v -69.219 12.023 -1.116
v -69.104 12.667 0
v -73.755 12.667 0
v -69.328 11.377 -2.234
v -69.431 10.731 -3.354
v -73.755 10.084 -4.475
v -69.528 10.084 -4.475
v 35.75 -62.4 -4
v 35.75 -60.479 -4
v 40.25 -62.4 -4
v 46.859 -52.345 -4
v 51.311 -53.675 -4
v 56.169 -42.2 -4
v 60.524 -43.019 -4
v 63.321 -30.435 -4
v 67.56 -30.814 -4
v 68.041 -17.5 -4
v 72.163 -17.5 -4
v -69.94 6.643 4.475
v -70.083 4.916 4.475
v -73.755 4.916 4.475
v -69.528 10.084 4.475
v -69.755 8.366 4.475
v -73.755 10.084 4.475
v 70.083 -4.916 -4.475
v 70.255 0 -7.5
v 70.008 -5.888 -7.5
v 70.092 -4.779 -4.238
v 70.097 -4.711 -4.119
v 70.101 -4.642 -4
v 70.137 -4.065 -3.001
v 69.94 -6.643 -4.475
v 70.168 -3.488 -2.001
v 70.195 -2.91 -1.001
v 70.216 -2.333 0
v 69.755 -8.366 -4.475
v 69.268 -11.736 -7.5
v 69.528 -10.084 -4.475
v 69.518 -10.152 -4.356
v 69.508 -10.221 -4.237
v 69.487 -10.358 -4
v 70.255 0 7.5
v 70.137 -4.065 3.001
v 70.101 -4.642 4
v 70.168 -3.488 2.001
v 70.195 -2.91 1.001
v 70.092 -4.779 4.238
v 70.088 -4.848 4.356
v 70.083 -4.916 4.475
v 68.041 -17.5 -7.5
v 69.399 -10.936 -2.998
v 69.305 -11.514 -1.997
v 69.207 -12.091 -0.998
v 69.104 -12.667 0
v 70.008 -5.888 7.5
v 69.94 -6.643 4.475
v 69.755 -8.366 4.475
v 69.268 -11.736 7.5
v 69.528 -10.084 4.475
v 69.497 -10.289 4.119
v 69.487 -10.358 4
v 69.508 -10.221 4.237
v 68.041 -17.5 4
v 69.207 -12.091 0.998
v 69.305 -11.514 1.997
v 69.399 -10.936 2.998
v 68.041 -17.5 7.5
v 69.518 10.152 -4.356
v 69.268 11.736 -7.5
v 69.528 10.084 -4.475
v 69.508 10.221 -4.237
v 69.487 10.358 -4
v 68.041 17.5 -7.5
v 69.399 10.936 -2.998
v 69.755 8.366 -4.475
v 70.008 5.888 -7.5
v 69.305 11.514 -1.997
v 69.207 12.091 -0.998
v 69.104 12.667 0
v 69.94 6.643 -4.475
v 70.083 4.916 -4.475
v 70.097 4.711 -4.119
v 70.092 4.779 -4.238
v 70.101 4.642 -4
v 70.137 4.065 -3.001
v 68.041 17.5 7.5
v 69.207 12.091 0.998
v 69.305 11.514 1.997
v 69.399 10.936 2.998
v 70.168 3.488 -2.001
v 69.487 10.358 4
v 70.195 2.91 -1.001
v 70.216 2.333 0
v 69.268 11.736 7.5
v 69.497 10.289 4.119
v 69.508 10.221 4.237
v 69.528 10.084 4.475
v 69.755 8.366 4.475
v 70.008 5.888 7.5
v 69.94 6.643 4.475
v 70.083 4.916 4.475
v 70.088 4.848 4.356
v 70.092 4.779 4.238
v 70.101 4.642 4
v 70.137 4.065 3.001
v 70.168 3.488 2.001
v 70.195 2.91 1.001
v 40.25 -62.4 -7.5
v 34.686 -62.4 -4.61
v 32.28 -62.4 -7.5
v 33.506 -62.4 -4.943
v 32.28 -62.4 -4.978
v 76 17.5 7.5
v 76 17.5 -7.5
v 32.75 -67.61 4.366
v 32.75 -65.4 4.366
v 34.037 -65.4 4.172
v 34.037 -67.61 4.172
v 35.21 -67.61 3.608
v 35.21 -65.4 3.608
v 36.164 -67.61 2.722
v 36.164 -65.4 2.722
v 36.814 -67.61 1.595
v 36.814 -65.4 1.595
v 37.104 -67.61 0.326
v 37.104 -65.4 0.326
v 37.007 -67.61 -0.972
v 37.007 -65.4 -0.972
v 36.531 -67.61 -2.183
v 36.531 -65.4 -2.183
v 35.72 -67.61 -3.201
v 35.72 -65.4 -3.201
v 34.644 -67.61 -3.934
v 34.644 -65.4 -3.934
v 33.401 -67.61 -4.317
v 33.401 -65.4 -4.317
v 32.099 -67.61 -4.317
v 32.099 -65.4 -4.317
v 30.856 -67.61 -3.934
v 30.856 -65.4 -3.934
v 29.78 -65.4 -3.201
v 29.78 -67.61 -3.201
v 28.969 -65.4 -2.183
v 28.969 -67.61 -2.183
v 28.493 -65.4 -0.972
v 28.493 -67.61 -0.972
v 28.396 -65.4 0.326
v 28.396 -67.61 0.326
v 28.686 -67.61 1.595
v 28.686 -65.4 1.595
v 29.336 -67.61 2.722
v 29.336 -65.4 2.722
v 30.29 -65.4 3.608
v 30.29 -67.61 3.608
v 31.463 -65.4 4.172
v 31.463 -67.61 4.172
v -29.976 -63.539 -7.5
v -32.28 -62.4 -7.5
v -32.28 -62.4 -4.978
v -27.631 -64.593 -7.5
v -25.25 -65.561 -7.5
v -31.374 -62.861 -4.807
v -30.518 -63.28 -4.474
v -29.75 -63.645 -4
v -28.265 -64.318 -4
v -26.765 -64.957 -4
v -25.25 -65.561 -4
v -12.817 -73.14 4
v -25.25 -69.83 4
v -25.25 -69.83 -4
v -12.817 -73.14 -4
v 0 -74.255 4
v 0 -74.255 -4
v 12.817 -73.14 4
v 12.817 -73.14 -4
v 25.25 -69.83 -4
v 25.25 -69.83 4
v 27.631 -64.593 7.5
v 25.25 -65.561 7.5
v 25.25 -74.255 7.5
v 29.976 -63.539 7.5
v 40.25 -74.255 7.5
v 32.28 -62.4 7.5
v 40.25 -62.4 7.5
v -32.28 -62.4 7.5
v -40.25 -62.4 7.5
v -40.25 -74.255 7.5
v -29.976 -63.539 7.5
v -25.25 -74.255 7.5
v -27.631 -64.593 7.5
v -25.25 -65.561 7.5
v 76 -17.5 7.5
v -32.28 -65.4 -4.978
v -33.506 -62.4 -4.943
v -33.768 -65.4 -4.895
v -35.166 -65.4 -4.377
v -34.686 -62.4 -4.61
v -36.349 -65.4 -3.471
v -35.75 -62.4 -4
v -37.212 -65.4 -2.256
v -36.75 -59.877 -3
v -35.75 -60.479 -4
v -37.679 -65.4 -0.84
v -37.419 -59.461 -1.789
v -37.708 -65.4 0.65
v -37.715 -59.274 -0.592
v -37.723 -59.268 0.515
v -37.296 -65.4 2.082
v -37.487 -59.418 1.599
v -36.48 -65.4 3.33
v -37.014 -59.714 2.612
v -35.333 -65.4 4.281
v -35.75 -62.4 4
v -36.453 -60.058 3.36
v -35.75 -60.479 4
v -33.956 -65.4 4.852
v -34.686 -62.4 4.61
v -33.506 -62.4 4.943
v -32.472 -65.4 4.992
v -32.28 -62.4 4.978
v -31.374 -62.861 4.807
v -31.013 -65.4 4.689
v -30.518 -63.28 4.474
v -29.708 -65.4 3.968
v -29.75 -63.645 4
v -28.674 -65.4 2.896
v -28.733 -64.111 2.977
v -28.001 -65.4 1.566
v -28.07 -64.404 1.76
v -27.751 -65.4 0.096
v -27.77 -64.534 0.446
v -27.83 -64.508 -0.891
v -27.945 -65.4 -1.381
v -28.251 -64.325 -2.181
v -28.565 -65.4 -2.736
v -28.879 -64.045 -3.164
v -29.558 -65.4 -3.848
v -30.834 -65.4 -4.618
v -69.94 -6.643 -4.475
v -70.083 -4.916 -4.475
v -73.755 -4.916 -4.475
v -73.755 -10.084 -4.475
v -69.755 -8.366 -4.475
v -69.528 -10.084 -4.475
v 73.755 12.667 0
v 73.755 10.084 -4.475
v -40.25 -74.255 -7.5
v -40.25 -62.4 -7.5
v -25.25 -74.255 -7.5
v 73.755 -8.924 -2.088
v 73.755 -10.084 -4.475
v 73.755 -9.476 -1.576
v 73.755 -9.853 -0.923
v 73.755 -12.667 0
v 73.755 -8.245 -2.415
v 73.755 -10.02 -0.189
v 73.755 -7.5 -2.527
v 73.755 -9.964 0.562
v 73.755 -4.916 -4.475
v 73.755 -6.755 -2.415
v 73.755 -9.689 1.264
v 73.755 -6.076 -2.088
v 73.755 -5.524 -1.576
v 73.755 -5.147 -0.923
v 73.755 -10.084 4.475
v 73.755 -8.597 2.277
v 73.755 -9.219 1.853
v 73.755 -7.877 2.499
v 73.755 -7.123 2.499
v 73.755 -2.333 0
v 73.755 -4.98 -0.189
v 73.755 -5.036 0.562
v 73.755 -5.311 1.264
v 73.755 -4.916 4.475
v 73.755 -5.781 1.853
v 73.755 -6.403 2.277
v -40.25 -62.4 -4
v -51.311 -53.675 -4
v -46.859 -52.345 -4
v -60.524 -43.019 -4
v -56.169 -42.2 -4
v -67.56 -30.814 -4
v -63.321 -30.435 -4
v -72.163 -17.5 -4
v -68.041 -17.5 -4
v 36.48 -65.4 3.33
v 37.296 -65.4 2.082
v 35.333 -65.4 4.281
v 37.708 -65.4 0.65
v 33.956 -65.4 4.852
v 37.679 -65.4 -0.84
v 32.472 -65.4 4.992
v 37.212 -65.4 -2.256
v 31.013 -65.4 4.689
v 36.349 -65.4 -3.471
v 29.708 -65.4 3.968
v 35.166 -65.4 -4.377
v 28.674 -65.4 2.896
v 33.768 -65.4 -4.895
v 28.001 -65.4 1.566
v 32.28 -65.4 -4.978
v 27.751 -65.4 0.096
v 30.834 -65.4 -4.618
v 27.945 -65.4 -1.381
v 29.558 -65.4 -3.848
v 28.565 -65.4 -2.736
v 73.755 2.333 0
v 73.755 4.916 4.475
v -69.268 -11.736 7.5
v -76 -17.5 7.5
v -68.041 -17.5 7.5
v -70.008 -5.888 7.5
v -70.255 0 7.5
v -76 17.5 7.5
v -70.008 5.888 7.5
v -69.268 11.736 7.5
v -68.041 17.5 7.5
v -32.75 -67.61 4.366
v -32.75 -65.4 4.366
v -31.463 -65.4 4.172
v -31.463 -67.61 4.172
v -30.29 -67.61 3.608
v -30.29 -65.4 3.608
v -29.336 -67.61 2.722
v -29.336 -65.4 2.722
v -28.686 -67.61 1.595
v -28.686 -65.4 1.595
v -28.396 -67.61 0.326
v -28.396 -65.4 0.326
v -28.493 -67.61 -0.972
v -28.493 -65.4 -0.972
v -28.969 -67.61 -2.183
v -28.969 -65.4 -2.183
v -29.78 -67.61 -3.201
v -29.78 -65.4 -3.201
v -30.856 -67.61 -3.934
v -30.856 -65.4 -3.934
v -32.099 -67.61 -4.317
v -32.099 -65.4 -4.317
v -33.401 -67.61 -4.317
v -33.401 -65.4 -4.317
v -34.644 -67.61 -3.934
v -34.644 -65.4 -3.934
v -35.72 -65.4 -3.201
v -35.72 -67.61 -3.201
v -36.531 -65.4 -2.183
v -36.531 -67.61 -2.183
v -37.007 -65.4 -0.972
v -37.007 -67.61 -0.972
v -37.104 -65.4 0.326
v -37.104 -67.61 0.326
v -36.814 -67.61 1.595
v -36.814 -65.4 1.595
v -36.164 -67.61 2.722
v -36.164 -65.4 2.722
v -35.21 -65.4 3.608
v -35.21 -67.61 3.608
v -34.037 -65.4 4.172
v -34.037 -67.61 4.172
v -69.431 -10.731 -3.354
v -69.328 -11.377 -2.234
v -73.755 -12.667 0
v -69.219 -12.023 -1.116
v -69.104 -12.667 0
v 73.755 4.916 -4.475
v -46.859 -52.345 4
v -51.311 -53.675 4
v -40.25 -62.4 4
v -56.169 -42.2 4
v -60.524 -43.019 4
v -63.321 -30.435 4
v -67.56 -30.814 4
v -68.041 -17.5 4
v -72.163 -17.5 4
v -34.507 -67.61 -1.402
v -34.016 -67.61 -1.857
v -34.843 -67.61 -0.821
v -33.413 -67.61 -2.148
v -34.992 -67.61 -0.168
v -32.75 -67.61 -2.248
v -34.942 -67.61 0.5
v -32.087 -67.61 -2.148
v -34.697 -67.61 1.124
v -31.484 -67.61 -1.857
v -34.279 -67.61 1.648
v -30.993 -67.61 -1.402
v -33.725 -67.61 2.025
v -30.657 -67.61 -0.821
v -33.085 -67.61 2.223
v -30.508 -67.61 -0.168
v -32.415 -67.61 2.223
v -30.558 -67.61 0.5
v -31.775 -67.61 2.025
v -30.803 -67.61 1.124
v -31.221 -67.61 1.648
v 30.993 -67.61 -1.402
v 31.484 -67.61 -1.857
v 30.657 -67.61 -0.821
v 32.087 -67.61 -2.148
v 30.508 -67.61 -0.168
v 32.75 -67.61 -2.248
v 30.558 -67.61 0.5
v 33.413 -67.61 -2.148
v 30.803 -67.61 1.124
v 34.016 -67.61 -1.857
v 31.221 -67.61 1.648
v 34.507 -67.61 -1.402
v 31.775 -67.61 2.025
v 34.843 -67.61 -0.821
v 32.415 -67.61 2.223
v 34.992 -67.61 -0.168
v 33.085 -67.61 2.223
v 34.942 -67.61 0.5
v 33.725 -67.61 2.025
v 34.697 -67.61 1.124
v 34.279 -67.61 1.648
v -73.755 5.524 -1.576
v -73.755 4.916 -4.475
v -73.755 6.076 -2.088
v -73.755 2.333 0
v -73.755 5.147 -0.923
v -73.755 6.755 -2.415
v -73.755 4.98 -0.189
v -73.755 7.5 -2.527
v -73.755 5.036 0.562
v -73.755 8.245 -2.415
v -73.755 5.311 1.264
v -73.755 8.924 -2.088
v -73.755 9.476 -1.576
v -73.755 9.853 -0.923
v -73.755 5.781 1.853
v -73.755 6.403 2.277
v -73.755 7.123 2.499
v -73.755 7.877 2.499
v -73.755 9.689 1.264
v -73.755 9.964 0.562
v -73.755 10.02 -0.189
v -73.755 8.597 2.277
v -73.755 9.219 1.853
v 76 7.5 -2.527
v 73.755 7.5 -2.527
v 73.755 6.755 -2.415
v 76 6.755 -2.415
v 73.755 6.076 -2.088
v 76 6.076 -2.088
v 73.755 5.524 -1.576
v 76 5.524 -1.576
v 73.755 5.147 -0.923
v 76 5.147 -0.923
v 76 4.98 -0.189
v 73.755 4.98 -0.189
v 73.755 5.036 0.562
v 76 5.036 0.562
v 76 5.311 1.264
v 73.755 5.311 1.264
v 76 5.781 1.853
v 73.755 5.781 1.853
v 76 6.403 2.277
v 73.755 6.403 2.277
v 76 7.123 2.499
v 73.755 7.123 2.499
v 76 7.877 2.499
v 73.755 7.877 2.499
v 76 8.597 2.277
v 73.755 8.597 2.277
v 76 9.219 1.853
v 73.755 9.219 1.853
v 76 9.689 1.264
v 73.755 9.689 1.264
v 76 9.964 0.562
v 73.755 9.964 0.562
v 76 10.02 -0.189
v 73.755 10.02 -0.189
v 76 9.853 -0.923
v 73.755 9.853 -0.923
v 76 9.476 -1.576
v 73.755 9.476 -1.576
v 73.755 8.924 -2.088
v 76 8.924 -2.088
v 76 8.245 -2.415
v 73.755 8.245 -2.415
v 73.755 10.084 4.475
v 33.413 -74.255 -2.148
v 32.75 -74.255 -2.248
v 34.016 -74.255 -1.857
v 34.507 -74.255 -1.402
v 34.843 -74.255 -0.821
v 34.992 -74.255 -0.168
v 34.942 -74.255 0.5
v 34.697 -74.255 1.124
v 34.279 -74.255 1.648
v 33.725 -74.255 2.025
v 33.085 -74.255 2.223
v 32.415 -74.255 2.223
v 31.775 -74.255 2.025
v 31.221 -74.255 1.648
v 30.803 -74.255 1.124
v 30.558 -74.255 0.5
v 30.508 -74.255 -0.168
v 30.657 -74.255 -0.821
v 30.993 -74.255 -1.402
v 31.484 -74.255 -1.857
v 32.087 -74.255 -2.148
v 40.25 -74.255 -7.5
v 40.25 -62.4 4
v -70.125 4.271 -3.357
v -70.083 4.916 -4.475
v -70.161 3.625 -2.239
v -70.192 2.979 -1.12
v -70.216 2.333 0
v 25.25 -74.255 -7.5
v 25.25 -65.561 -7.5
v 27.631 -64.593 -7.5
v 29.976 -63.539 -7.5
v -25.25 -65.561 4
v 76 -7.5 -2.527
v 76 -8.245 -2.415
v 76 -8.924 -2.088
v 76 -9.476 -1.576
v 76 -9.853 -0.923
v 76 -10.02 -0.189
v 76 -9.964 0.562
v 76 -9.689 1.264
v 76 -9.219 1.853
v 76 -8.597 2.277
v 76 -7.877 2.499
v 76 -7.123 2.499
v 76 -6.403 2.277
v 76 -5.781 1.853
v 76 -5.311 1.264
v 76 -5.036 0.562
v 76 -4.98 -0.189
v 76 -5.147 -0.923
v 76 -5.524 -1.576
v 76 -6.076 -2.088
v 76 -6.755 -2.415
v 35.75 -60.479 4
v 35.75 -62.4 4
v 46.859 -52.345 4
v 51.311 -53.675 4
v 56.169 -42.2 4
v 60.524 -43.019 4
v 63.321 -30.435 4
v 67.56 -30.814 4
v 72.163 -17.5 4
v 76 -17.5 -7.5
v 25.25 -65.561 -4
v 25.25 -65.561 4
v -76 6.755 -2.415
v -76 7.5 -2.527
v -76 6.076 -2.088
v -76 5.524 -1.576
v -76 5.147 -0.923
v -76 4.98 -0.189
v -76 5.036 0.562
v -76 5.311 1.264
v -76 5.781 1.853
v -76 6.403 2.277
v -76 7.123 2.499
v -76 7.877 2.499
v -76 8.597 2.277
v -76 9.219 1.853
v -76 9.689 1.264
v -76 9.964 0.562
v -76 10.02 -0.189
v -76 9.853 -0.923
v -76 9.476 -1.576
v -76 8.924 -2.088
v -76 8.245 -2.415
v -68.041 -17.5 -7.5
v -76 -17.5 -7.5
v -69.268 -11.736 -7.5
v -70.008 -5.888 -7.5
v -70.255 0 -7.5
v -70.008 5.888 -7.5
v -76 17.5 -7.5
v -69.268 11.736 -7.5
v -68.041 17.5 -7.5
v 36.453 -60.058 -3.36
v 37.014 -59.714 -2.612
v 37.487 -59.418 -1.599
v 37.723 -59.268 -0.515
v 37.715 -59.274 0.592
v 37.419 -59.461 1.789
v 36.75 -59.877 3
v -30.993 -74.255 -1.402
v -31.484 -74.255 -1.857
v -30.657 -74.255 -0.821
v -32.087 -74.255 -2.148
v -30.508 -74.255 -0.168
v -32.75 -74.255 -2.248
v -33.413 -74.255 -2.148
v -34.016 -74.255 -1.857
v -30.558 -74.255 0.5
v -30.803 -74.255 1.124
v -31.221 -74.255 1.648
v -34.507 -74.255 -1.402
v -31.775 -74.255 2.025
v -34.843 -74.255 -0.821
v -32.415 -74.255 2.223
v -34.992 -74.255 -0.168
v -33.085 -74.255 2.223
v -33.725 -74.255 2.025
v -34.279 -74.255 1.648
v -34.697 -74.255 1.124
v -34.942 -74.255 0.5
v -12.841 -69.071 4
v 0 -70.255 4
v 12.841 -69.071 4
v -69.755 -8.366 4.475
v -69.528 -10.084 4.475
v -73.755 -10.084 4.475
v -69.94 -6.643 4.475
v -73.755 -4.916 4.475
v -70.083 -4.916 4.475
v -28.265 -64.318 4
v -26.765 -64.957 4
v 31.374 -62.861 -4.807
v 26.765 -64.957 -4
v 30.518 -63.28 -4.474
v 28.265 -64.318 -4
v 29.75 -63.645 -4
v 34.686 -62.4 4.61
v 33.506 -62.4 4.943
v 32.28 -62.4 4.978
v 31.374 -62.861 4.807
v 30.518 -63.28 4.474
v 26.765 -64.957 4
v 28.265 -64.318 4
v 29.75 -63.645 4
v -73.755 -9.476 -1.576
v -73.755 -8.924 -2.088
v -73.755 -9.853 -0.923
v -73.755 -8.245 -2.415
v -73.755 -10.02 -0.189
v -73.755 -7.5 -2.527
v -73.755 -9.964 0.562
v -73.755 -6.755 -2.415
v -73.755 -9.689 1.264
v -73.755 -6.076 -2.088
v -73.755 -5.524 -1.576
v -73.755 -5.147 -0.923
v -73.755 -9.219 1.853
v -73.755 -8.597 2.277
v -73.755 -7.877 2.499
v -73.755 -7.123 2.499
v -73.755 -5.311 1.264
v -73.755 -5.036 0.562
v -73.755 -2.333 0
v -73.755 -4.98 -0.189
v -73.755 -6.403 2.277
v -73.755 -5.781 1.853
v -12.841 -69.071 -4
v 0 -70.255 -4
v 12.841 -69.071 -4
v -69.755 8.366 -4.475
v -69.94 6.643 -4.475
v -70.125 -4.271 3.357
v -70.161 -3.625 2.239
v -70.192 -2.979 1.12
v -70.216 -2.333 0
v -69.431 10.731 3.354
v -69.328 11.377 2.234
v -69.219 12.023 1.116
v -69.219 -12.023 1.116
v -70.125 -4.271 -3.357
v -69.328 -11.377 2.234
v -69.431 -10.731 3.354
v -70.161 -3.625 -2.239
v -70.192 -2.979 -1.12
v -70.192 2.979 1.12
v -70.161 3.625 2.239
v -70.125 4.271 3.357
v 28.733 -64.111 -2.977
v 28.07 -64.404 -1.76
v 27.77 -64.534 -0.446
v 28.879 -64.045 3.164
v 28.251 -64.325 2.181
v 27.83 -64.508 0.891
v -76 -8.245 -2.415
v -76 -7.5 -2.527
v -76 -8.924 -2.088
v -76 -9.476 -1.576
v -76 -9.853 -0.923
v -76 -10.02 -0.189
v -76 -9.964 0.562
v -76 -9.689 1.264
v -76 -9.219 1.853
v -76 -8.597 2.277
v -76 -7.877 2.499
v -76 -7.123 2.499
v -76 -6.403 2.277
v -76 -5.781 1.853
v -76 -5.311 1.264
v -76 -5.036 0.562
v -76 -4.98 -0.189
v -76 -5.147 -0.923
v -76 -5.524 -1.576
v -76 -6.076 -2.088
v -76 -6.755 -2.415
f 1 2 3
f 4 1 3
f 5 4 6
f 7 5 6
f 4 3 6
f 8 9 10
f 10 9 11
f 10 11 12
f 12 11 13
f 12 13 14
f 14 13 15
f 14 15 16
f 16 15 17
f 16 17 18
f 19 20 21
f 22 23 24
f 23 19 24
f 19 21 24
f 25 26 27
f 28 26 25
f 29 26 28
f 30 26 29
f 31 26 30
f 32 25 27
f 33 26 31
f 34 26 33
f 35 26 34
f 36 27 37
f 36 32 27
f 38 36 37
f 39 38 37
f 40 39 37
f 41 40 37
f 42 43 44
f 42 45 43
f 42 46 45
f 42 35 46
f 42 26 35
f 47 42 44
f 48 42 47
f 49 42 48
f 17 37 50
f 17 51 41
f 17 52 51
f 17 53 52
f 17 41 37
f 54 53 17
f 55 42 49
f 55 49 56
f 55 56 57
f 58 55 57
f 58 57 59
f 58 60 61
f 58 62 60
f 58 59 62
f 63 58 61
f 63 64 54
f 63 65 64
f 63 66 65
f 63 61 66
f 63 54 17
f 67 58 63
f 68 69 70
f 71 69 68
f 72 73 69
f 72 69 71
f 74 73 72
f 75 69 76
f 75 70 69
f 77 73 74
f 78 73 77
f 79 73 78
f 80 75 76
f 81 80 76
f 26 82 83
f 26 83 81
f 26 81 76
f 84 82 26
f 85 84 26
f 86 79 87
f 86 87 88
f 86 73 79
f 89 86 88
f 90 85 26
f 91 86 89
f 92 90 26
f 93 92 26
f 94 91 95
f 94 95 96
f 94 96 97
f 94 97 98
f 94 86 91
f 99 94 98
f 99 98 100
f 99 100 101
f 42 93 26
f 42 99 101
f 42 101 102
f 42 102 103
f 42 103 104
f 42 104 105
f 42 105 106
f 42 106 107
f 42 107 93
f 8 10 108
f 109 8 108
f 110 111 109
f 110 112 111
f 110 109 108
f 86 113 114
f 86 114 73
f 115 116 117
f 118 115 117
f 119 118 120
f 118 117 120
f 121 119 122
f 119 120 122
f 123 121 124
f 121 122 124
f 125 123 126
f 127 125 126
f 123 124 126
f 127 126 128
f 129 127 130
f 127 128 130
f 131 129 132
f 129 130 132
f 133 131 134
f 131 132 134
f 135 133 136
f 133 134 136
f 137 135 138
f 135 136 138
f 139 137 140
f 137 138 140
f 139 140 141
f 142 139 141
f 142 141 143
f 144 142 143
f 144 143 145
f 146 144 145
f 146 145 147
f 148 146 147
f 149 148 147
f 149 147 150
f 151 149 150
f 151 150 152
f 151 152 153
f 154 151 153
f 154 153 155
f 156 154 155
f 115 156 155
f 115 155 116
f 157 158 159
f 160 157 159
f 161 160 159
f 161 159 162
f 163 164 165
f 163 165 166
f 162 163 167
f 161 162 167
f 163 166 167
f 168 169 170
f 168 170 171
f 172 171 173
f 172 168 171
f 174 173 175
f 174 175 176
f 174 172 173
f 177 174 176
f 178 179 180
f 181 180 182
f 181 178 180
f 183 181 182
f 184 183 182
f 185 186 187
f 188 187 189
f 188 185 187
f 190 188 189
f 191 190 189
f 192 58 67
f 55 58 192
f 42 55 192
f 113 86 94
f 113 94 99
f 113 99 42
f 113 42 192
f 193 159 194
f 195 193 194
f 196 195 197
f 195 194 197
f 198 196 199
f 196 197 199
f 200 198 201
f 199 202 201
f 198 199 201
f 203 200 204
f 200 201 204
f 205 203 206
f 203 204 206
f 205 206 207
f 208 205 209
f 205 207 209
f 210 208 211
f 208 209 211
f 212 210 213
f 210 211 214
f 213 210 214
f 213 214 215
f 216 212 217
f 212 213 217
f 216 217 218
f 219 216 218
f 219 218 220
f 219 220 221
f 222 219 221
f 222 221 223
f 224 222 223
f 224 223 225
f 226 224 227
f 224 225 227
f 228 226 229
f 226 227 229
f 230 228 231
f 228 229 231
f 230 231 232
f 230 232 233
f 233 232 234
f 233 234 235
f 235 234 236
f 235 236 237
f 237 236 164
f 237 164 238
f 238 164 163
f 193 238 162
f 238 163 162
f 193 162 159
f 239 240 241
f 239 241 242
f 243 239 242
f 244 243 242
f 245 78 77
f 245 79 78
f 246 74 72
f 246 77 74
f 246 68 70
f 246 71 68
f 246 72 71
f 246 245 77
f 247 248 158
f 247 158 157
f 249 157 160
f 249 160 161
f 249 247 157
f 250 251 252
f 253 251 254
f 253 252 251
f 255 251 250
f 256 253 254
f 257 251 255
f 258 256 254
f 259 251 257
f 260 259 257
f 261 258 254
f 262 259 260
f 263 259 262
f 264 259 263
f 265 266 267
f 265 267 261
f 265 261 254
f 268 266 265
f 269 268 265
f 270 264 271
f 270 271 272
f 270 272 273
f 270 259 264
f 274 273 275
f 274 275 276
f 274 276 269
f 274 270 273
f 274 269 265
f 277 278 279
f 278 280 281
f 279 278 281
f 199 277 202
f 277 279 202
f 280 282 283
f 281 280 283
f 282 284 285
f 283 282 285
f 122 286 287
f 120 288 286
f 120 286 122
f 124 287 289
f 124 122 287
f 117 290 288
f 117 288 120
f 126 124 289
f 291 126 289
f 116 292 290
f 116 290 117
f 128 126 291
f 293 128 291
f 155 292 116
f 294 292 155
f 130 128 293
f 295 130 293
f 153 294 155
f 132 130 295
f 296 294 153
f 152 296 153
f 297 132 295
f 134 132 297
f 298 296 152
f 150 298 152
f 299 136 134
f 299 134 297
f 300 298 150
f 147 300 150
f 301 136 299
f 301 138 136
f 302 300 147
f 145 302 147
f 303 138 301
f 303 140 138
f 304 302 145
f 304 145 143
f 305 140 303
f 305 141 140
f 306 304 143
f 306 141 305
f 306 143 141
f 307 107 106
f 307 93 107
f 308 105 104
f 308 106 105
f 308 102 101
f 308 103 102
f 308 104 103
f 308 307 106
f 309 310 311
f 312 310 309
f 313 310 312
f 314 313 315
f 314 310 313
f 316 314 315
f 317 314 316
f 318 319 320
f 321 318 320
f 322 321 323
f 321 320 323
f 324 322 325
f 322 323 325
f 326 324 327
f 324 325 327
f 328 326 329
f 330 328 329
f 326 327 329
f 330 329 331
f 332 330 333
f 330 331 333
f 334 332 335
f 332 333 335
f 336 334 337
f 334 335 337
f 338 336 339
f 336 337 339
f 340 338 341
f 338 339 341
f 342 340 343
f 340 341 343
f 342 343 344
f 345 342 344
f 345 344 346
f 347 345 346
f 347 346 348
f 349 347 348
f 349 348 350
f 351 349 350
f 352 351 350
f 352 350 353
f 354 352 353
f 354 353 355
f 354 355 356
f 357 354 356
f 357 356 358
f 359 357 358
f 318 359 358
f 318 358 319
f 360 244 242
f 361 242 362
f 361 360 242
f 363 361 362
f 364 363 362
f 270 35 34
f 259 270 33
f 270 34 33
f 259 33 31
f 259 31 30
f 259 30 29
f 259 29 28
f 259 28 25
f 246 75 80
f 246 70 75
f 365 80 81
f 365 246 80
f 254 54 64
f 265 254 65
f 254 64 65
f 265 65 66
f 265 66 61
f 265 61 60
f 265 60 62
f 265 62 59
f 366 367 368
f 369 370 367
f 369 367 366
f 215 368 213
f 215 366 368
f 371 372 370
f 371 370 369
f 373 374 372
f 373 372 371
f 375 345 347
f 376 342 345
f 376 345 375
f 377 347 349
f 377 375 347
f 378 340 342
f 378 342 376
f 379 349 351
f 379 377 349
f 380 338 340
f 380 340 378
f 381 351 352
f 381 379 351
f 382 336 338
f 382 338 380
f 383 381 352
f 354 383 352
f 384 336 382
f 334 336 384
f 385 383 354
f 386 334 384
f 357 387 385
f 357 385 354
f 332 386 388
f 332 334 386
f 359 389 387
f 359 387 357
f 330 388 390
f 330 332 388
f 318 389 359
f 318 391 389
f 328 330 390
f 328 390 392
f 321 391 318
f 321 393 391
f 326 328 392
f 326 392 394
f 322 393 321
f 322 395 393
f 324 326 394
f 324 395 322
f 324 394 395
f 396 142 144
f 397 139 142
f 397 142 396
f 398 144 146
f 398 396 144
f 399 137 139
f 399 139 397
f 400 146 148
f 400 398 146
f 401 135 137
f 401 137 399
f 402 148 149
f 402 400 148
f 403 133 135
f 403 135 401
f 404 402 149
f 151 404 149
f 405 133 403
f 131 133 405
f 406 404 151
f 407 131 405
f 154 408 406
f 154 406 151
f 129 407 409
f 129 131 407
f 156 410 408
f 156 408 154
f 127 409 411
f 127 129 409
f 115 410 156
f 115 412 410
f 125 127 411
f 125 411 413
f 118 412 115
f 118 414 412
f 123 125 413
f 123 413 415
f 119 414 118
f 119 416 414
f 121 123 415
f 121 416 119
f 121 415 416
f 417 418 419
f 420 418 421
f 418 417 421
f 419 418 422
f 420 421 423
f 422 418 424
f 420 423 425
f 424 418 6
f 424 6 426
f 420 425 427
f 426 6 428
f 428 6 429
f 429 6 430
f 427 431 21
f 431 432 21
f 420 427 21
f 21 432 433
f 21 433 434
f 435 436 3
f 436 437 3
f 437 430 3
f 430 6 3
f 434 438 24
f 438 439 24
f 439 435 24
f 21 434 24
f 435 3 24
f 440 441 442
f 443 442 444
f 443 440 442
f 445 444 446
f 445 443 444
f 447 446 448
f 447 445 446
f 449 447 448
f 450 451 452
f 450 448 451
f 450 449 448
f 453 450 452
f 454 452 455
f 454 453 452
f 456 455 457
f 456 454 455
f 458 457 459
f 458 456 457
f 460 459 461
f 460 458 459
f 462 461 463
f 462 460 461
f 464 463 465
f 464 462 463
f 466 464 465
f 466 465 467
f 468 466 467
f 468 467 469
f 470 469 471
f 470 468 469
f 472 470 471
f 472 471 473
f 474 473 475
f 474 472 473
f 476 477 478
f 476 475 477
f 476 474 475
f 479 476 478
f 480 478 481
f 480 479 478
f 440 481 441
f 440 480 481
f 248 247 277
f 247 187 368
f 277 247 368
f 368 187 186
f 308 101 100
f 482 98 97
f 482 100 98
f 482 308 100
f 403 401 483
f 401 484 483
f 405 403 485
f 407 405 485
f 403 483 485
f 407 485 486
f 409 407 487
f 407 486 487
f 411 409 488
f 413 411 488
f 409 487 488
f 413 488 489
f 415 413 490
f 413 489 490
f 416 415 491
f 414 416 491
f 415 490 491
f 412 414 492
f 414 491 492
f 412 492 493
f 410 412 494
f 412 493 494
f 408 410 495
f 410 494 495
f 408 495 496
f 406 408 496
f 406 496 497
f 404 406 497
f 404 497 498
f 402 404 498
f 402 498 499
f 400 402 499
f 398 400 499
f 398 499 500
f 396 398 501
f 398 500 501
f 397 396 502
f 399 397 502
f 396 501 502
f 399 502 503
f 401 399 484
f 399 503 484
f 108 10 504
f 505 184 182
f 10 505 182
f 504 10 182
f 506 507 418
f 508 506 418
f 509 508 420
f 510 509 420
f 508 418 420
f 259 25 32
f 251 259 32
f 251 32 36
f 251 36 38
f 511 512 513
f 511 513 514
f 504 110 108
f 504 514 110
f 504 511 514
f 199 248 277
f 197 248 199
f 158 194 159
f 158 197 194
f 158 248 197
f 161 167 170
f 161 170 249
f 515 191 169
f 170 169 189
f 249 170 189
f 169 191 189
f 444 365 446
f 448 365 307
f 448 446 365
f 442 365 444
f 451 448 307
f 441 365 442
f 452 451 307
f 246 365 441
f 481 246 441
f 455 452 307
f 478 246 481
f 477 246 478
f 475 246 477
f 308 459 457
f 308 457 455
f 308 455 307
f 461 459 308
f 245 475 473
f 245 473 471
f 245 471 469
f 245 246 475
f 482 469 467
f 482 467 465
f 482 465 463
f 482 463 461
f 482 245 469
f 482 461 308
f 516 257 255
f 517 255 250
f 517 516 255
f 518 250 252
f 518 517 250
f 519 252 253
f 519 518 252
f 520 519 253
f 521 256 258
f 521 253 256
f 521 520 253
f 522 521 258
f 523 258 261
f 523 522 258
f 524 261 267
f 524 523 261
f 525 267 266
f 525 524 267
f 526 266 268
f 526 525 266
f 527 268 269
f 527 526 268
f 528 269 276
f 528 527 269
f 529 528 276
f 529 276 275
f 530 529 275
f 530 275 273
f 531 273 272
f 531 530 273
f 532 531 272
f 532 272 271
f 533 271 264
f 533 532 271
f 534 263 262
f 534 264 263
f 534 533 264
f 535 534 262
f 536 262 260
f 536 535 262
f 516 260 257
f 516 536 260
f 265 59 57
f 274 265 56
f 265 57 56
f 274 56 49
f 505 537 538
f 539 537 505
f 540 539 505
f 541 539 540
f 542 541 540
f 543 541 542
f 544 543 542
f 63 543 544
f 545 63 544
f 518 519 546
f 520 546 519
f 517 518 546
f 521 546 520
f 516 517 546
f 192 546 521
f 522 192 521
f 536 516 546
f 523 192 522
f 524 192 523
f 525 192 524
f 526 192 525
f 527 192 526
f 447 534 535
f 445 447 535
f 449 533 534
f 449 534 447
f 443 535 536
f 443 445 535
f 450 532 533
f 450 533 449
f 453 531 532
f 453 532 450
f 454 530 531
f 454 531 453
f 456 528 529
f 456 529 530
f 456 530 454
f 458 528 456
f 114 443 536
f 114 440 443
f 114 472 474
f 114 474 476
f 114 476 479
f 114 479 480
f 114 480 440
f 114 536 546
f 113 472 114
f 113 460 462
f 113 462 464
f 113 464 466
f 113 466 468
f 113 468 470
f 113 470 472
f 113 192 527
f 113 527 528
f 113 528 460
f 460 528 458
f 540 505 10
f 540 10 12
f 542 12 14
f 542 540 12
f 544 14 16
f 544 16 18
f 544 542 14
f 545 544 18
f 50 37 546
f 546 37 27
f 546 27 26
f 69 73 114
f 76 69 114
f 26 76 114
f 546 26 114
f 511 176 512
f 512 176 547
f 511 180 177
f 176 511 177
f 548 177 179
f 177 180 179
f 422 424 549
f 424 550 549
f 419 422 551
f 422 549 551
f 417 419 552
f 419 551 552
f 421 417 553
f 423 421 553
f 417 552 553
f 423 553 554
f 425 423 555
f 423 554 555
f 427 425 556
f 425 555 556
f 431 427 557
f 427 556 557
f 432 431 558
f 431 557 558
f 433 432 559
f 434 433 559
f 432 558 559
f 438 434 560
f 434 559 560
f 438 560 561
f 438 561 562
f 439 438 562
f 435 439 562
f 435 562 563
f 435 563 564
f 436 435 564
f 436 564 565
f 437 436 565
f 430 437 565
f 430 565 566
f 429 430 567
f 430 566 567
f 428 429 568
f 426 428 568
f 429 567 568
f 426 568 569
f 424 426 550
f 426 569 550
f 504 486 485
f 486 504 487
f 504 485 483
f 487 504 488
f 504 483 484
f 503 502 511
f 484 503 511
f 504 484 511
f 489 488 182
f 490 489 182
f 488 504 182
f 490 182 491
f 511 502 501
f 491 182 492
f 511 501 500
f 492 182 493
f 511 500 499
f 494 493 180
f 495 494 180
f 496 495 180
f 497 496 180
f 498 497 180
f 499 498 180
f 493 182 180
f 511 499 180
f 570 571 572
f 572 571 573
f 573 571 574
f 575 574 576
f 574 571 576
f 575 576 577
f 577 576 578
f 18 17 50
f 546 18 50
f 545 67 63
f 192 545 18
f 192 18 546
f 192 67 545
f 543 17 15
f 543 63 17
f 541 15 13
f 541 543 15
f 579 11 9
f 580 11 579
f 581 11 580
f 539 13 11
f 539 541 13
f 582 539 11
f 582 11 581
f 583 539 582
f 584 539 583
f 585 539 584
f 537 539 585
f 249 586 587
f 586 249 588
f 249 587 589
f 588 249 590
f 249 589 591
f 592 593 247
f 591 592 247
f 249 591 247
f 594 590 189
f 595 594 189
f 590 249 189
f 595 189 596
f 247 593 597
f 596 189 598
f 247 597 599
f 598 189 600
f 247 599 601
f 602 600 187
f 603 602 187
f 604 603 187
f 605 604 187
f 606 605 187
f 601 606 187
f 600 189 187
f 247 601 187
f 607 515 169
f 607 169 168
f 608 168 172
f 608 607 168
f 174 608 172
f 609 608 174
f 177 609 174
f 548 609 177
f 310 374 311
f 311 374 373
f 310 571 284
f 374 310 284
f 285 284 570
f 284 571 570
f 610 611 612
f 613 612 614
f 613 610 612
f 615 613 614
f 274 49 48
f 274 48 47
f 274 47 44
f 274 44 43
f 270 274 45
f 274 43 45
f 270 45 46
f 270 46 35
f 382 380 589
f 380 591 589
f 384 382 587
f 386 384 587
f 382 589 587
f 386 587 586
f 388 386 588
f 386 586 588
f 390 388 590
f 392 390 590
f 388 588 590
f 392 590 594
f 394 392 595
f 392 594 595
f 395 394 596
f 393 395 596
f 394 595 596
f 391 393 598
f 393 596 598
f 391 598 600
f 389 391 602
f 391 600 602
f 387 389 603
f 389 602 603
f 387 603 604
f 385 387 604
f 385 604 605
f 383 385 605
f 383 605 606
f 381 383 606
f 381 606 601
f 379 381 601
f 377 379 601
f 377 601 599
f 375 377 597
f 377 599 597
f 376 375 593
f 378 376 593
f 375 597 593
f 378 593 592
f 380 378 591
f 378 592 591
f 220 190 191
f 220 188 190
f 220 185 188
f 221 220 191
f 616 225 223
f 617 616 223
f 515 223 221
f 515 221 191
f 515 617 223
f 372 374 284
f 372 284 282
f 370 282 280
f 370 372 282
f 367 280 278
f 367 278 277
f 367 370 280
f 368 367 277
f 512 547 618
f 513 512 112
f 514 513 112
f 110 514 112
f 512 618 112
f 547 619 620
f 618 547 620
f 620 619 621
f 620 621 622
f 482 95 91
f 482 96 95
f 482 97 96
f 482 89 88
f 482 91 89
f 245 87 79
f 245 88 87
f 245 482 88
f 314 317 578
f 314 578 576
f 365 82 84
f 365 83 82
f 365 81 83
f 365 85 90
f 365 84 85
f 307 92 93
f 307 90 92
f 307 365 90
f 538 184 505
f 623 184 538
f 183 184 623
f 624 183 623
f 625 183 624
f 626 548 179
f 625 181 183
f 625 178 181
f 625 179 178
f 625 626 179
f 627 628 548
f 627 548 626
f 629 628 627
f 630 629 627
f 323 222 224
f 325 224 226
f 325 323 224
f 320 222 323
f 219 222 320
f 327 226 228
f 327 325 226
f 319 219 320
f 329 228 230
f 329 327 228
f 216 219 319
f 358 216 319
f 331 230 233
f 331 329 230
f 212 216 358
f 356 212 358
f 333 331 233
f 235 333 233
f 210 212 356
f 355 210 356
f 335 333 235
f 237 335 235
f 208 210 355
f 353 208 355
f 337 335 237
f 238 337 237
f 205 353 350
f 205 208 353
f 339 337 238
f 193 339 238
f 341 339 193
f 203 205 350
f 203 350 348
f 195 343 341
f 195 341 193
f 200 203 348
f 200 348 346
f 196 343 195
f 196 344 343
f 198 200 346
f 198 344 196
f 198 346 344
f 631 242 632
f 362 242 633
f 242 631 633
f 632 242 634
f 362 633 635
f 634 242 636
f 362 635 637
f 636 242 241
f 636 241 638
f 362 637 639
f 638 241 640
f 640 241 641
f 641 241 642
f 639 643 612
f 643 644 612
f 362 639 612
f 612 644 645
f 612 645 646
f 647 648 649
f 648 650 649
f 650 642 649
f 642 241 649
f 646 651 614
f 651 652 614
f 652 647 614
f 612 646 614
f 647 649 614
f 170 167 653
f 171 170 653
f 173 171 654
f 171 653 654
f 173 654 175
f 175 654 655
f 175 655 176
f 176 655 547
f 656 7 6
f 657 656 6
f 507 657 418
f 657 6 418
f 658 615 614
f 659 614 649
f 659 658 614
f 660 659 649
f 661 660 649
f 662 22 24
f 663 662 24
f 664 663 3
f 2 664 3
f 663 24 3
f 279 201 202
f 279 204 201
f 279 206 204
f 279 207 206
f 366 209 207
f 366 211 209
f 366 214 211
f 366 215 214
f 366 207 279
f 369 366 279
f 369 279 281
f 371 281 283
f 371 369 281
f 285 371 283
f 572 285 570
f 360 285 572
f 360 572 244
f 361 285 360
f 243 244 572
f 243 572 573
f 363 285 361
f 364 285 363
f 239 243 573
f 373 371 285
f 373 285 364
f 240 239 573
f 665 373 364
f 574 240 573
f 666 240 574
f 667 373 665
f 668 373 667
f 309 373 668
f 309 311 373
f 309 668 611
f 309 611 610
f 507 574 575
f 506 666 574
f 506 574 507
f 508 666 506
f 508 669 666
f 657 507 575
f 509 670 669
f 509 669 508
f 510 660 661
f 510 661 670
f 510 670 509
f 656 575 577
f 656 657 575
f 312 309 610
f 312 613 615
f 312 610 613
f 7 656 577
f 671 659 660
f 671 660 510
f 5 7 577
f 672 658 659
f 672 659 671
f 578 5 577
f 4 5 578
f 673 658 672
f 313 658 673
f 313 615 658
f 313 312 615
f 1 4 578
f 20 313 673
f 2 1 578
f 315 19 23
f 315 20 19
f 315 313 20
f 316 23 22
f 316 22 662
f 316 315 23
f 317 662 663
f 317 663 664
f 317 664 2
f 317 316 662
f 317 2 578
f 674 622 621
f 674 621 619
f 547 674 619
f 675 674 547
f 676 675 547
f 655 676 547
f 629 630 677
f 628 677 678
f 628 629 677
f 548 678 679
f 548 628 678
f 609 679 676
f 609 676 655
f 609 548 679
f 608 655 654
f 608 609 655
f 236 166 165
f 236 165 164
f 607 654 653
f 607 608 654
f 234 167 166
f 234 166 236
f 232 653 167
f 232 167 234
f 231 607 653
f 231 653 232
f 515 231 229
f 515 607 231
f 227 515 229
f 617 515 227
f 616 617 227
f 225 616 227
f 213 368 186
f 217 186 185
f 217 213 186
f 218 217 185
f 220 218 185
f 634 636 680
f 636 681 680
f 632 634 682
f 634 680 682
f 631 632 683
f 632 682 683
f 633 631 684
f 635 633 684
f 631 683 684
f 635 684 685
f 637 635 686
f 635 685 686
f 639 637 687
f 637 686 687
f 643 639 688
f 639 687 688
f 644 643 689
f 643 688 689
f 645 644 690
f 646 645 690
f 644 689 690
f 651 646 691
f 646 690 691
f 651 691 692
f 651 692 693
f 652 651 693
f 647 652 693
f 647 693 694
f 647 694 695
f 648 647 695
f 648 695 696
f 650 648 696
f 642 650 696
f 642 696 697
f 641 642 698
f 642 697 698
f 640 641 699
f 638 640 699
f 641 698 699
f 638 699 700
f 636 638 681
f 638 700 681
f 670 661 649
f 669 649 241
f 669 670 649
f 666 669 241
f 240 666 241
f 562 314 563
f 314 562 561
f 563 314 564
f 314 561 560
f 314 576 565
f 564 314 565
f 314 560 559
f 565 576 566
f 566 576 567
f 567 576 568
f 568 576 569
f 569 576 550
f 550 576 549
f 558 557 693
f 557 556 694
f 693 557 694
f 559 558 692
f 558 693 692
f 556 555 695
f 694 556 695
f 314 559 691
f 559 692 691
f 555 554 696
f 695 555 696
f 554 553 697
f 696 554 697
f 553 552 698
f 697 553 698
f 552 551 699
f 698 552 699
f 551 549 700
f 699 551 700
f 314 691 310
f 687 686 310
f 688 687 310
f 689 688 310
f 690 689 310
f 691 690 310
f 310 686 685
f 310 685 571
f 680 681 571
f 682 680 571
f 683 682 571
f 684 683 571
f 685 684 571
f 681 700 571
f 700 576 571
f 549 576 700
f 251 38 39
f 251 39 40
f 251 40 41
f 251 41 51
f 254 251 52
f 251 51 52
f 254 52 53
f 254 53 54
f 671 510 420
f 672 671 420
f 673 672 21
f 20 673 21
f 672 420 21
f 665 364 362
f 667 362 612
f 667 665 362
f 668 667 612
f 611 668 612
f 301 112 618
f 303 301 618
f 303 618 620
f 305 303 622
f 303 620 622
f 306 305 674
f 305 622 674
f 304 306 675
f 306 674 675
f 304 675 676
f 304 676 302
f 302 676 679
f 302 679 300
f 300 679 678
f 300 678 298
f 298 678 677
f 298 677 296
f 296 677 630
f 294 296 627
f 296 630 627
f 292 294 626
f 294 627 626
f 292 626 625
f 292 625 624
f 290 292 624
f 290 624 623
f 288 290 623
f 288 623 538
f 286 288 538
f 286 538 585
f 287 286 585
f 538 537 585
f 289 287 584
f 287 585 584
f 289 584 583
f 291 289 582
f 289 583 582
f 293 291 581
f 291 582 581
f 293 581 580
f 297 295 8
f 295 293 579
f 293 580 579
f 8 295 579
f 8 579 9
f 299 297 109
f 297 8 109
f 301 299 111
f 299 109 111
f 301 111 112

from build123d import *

# Parameters (mm, degrees)
BOSS_EXTRUDE1_DEPTH                            = 4
BOSS_EXTRUDE2_DEPTH                            = 7.5
CUT_EXTRUDE1_DEPTH                             = 3.5
F_8_0_199_DIAMETER_HOLE1_AT_2_COUNT            = 2
F_8_0_199_DIAMETER_HOLE1_AT_2_PITCH            = 15
BOSS_EXTRUDE3_REACH                            = 108.518
BOSS_EXTRUDE3_DIRECTION_2_REACH                = 108.518
SKETCH6_R                                      = 5
CUT_EXTRUDE2_DEPTH                             = 3.5
CUT_EXTRUDE2_DEPTH_BACK                        = 3
CBORE_FOR_8_BUTTON_HEAD_CAP_SCREW1_D           = 4.4958
CBORE_FOR_8_BUTTON_HEAD_CAP_SCREW1_DEPTH       = 11.649325414
CBORE_FOR_8_BUTTON_HEAD_CAP_SCREW1_CBORE_D     = 8.73252
CBORE_FOR_8_BUTTON_HEAD_CAP_SCREW1_CBORE_DEPTH = 2.2098
CBORE_FOR_8_BUTTON_HEAD_CAP_SCREW1_TIP         = 1.350674586


with BuildPart() as part:
    # Sketch1 → Boss-Extrude1 (new, symmetric)
    with BuildSketch(Plane.XY):
        with BuildLine():
            Line((-76, 17.5), (-76, 0))
            Line((-76, 0), (-76, -17.5))
            Line((-76, -17.5), (-72.163391169, -17.5))
            Line((-72.163391169, -17.5), (-68.04053957, -17.5))
            ThreePointArc((-68.04053957, -17.5), (-69.699186267, -8.81977657), (-70.255, 0))
            ThreePointArc((-70.255, 0), (-69.699186267, 8.81977657), (-68.04053957, 17.5))
            Line((-68.04053957, 17.5), (-70.255, 17.5))
            Line((-70.255, 17.5), (-76, 17.5))
        make_face()
        with BuildLine():
            Line((-68.04053957, -17.5), (-72.163391169, -17.5))
            ThreePointArc((-72.163391169, -17.5), (0, -74.255), (72.163391169, -17.5))
            Line((72.163391169, -17.5), (68.04053957, -17.5))
            ThreePointArc((68.04053957, -17.5), (0, -70.255), (-68.04053957, -17.5))
        make_face()
        with BuildLine():
            Line((68.04053957, -17.5), (72.163391169, -17.5))
            Line((72.163391169, -17.5), (76, -17.5))
            Line((76, -17.5), (76, 0))
            Line((76, 0), (76, 17.5))
            Line((76, 17.5), (70.255, 17.5))
            Line((70.255, 17.5), (68.04053957, 17.5))
            ThreePointArc((68.04053957, 17.5), (69.699186267, 8.81977657), (70.255, 0))
            ThreePointArc((70.255, 0), (69.699186267, -8.81977657), (68.04053957, -17.5))
        make_face()
    extrude(amount=BOSS_EXTRUDE1_DEPTH, both=True)

    # Sketch1<5> → Boss-Extrude2 (add, symmetric)
    with BuildSketch(Plane.XY):
        with BuildLine():
            Line((-76, 17.5), (-76, 0))
            Line((-76, 0), (-76, -17.5))
            Line((-76, -17.5), (-72.163391169, -17.5))
            Line((-72.163391169, -17.5), (-68.04053957, -17.5))
            ThreePointArc((-68.04053957, -17.5), (-69.699186267, -8.81977657), (-70.255, 0))
            ThreePointArc((-70.255, 0), (-69.699186267, 8.81977657), (-68.04053957, 17.5))
            Line((-68.04053957, 17.5), (-70.255, 17.5))
            Line((-70.255, 17.5), (-76, 17.5))
        make_face()
        with BuildLine():
            Line((68.04053957, -17.5), (72.163391169, -17.5))
            Line((72.163391169, -17.5), (76, -17.5))
            Line((76, -17.5), (76, 0))
            Line((76, 0), (76, 17.5))
            Line((76, 17.5), (70.255, 17.5))
            Line((70.255, 17.5), (68.04053957, 17.5))
            ThreePointArc((68.04053957, 17.5), (69.699186267, 8.81977657), (70.255, 0))
            ThreePointArc((70.255, 0), (69.699186267, -8.81977657), (68.04053957, -17.5))
        make_face()
    extrude(amount=BOSS_EXTRUDE2_DEPTH, both=True)

    # Sketch2 → Cut-Extrude1 (cut, symmetric)
    with BuildSketch(Plane.ZY.offset(-70.255)):
        Polygon((0, 2.332715091), (4.475, 4.916357545), (4.475, 10.083642455), (0, 12.667284909), (-4.475, 10.083642455), (-4.475, 4.916357545), align=None)
        Polygon((0, -12.667284909), (4.475, -10.083642455), (4.475, -4.916357545), (0, -2.332715091), (-4.475, -4.916357545), (-4.475, -10.083642455), align=None)
    cut_extrude1 = extrude(amount=CUT_EXTRUDE1_DEPTH, both=True, mode=Mode.SUBTRACT)

    # Sketch4 → #8 (0.199) Diameter Hole1 (revolve, cut)
    with BuildSketch(Plane(origin=(76, 7.5, 0), x_dir=(0, 0, -1), z_dir=(0, 1, 0))):
        Polygon((0, 0), (0, 10.71), (2.5273, 9.191444958), (2.5273, 0), align=None)
    f_8_0_199_diameter_hole1 = revolve(axis=Axis((82.35, 7.5, 0), (-1, 0, 0)), mode=Mode.SUBTRACT)

    # #8 (0.199) Diameter Hole1 at 2: #8 (0.199) Diameter Hole1 ×2
    with Locations(*[(0, -i * F_8_0_199_DIAMETER_HOLE1_AT_2_PITCH, 0) for i in range(1, F_8_0_199_DIAMETER_HOLE1_AT_2_COUNT)]):
        add(f_8_0_199_diameter_hole1, mode=Mode.SUBTRACT)

    # Mirror1: Cut-Extrude1, #8 (0.199) Diameter Hole1 across plane
    add(cut_extrude1.mirror(Plane(origin=(0, 0, 0), x_dir=(0, 0, 1), z_dir=(1, 0, 0))), mode=Mode.SUBTRACT)
    add(f_8_0_199_diameter_hole1.mirror(Plane(origin=(0, 0, 0), x_dir=(0, 0, 1), z_dir=(1, 0, 0))), mode=Mode.SUBTRACT)

    # Mirror1 copy 1 sketch → Mirror1 copy 1 (revolve, cut)
    with BuildSketch(Plane(origin=(-76, -7.5, 0), x_dir=(0, 0, -1), z_dir=(0, 1, 0))):
        Polygon((0, 0), (0, -10.71), (2.5273, -9.191444958), (2.5273, 0), align=None)
    revolve(axis=Axis((-82.35, -7.5, 0), (-1, 0, 0)), mode=Mode.SUBTRACT)

    # Boss-Extrude3: up to this face of the body (flat: up to its plane)
    boss_extrude3_end = Plane(part.part.faces().sort_by_distance((-72.727295349, 0, 7.5))[0])
    # Sketch5 → Boss-Extrude3 (add, up to the picked face)
    with BuildSketch(Plane.XY, mode=Mode.PRIVATE) as boss_extrude3_sk1:
        with BuildLine():
            Line((40.25, -62.399859976), (40.25, -74.255))
            Line((40.25, -74.255), (25.25, -74.255))
            Line((25.25, -74.255), (25.25, -65.560678192))
            ThreePointArc((25.25, -65.560678192), (28.808569138, -64.076761538), (32.280373294, -62.399859976))
            Line((32.280373294, -62.399859976), (40.25, -62.399859976))
        make_face()
    boss_extrude3_tool1 = split(extrude(boss_extrude3_sk1.sketch, amount=BOSS_EXTRUDE3_REACH, mode=Mode.PRIVATE), bisect_by=boss_extrude3_end, keep=Keep.BOTH, mode=Mode.PRIVATE)
    # Sketch5 → Boss-Extrude3 (add, up to the picked face)
    with BuildSketch(Plane.XY, mode=Mode.PRIVATE) as boss_extrude3_sk2:
        with BuildLine():
            Line((-25.25, -74.255), (-40.25, -74.255))
            Line((-40.25, -74.255), (-40.25, -62.399859976))
            Line((-40.25, -62.399859976), (-32.280373294, -62.399859976))
            ThreePointArc((-32.280373294, -62.399859976), (-28.808569138, -64.076761538), (-25.25, -65.560678192))
            Line((-25.25, -65.560678192), (-25.25, -74.255))
        make_face()
    boss_extrude3_tool2 = split(extrude(boss_extrude3_sk2.sketch, amount=BOSS_EXTRUDE3_REACH, mode=Mode.PRIVATE), bisect_by=boss_extrude3_end, keep=Keep.BOTH, mode=Mode.PRIVATE)
    add(boss_extrude3_tool1.solids().sort_by(Axis((33.107767, -68.667419, 0), (0, 0, 1)))[0])
    add(boss_extrude3_tool2.solids().sort_by(Axis((-33.107767, -68.667419, 0), (0, 0, 1)))[0])

    # Boss-Extrude3 direction 2: up to this face of the body (flat: up to its plane)
    boss_extrude3_direction_2_end = Plane(part.part.faces().sort_by_distance((-72.727295349, 0, -7.5))[0])
    # Sketch5 → Boss-Extrude3 direction 2 (add, up to the picked face)
    with BuildSketch(Plane.XY, mode=Mode.PRIVATE) as boss_extrude3_direction_2_sk1:
        with BuildLine():
            Line((40.25, -62.399859976), (40.25, -74.255))
            Line((40.25, -74.255), (25.25, -74.255))
            Line((25.25, -74.255), (25.25, -65.560678192))
            ThreePointArc((25.25, -65.560678192), (28.808569138, -64.076761538), (32.280373294, -62.399859976))
            Line((32.280373294, -62.399859976), (40.25, -62.399859976))
        make_face()
    boss_extrude3_direction_2_tool1 = split(extrude(boss_extrude3_direction_2_sk1.sketch, amount=-BOSS_EXTRUDE3_DIRECTION_2_REACH, mode=Mode.PRIVATE), bisect_by=boss_extrude3_direction_2_end, keep=Keep.BOTH, mode=Mode.PRIVATE)
    # Sketch5 → Boss-Extrude3 direction 2 (add, up to the picked face)
    with BuildSketch(Plane.XY, mode=Mode.PRIVATE) as boss_extrude3_direction_2_sk2:
        with BuildLine():
            Line((-25.25, -74.255), (-40.25, -74.255))
            Line((-40.25, -74.255), (-40.25, -62.399859976))
            Line((-40.25, -62.399859976), (-32.280373294, -62.399859976))
            ThreePointArc((-32.280373294, -62.399859976), (-28.808569138, -64.076761538), (-25.25, -65.560678192))
            Line((-25.25, -65.560678192), (-25.25, -74.255))
        make_face()
    boss_extrude3_direction_2_tool2 = split(extrude(boss_extrude3_direction_2_sk2.sketch, amount=-BOSS_EXTRUDE3_DIRECTION_2_REACH, mode=Mode.PRIVATE), bisect_by=boss_extrude3_direction_2_end, keep=Keep.BOTH, mode=Mode.PRIVATE)
    add(boss_extrude3_direction_2_tool1.solids().sort_by(Axis((33.107767, -68.667419, 0), (0, 0, -1)))[0])
    add(boss_extrude3_direction_2_tool2.solids().sort_by(Axis((-33.107767, -68.667419, 0), (0, 0, -1)))[0])

    # Sketch6 → Cut-Extrude2 (cut, two sides)
    with BuildSketch(Plane(origin=(0, -62.399859976, 0), x_dir=(1, 0, 0), z_dir=(0, 1, 0))) as cut_extrude2_sk:
        with Locations(Location((-32.75, 0, 0), (0, 0, 84.610530172))):
            Circle(SKETCH6_R)
        with Locations(Location((32.75, 0, 0), (0, 0, 95.389469991))):
            Circle(SKETCH6_R)
    extrude(amount=CUT_EXTRUDE2_DEPTH, mode=Mode.SUBTRACT)
    extrude(cut_extrude2_sk.sketch, amount=-CUT_EXTRUDE2_DEPTH_BACK, mode=Mode.SUBTRACT)

    # CBORE for #8 Button Head Cap Screw1
    with Locations(Plane(origin=(-32.75, -65.399859976, 0), x_dir=(0, 0, 1), z_dir=(0, 1, 0))):
        with Locations((0, 0), (0, 65.5)):
            CounterBoreHole(CBORE_FOR_8_BUTTON_HEAD_CAP_SCREW1_D / 2, CBORE_FOR_8_BUTTON_HEAD_CAP_SCREW1_CBORE_D / 2, CBORE_FOR_8_BUTTON_HEAD_CAP_SCREW1_CBORE_DEPTH, depth=CBORE_FOR_8_BUTTON_HEAD_CAP_SCREW1_DEPTH)
            with Locations((0, 0, -(CBORE_FOR_8_BUTTON_HEAD_CAP_SCREW1_DEPTH + CBORE_FOR_8_BUTTON_HEAD_CAP_SCREW1_TIP / 2))):  # 118° drill point
                Cone(0, CBORE_FOR_8_BUTTON_HEAD_CAP_SCREW1_D / 2, CBORE_FOR_8_BUTTON_HEAD_CAP_SCREW1_TIP, mode=Mode.SUBTRACT)


solid = part.part
